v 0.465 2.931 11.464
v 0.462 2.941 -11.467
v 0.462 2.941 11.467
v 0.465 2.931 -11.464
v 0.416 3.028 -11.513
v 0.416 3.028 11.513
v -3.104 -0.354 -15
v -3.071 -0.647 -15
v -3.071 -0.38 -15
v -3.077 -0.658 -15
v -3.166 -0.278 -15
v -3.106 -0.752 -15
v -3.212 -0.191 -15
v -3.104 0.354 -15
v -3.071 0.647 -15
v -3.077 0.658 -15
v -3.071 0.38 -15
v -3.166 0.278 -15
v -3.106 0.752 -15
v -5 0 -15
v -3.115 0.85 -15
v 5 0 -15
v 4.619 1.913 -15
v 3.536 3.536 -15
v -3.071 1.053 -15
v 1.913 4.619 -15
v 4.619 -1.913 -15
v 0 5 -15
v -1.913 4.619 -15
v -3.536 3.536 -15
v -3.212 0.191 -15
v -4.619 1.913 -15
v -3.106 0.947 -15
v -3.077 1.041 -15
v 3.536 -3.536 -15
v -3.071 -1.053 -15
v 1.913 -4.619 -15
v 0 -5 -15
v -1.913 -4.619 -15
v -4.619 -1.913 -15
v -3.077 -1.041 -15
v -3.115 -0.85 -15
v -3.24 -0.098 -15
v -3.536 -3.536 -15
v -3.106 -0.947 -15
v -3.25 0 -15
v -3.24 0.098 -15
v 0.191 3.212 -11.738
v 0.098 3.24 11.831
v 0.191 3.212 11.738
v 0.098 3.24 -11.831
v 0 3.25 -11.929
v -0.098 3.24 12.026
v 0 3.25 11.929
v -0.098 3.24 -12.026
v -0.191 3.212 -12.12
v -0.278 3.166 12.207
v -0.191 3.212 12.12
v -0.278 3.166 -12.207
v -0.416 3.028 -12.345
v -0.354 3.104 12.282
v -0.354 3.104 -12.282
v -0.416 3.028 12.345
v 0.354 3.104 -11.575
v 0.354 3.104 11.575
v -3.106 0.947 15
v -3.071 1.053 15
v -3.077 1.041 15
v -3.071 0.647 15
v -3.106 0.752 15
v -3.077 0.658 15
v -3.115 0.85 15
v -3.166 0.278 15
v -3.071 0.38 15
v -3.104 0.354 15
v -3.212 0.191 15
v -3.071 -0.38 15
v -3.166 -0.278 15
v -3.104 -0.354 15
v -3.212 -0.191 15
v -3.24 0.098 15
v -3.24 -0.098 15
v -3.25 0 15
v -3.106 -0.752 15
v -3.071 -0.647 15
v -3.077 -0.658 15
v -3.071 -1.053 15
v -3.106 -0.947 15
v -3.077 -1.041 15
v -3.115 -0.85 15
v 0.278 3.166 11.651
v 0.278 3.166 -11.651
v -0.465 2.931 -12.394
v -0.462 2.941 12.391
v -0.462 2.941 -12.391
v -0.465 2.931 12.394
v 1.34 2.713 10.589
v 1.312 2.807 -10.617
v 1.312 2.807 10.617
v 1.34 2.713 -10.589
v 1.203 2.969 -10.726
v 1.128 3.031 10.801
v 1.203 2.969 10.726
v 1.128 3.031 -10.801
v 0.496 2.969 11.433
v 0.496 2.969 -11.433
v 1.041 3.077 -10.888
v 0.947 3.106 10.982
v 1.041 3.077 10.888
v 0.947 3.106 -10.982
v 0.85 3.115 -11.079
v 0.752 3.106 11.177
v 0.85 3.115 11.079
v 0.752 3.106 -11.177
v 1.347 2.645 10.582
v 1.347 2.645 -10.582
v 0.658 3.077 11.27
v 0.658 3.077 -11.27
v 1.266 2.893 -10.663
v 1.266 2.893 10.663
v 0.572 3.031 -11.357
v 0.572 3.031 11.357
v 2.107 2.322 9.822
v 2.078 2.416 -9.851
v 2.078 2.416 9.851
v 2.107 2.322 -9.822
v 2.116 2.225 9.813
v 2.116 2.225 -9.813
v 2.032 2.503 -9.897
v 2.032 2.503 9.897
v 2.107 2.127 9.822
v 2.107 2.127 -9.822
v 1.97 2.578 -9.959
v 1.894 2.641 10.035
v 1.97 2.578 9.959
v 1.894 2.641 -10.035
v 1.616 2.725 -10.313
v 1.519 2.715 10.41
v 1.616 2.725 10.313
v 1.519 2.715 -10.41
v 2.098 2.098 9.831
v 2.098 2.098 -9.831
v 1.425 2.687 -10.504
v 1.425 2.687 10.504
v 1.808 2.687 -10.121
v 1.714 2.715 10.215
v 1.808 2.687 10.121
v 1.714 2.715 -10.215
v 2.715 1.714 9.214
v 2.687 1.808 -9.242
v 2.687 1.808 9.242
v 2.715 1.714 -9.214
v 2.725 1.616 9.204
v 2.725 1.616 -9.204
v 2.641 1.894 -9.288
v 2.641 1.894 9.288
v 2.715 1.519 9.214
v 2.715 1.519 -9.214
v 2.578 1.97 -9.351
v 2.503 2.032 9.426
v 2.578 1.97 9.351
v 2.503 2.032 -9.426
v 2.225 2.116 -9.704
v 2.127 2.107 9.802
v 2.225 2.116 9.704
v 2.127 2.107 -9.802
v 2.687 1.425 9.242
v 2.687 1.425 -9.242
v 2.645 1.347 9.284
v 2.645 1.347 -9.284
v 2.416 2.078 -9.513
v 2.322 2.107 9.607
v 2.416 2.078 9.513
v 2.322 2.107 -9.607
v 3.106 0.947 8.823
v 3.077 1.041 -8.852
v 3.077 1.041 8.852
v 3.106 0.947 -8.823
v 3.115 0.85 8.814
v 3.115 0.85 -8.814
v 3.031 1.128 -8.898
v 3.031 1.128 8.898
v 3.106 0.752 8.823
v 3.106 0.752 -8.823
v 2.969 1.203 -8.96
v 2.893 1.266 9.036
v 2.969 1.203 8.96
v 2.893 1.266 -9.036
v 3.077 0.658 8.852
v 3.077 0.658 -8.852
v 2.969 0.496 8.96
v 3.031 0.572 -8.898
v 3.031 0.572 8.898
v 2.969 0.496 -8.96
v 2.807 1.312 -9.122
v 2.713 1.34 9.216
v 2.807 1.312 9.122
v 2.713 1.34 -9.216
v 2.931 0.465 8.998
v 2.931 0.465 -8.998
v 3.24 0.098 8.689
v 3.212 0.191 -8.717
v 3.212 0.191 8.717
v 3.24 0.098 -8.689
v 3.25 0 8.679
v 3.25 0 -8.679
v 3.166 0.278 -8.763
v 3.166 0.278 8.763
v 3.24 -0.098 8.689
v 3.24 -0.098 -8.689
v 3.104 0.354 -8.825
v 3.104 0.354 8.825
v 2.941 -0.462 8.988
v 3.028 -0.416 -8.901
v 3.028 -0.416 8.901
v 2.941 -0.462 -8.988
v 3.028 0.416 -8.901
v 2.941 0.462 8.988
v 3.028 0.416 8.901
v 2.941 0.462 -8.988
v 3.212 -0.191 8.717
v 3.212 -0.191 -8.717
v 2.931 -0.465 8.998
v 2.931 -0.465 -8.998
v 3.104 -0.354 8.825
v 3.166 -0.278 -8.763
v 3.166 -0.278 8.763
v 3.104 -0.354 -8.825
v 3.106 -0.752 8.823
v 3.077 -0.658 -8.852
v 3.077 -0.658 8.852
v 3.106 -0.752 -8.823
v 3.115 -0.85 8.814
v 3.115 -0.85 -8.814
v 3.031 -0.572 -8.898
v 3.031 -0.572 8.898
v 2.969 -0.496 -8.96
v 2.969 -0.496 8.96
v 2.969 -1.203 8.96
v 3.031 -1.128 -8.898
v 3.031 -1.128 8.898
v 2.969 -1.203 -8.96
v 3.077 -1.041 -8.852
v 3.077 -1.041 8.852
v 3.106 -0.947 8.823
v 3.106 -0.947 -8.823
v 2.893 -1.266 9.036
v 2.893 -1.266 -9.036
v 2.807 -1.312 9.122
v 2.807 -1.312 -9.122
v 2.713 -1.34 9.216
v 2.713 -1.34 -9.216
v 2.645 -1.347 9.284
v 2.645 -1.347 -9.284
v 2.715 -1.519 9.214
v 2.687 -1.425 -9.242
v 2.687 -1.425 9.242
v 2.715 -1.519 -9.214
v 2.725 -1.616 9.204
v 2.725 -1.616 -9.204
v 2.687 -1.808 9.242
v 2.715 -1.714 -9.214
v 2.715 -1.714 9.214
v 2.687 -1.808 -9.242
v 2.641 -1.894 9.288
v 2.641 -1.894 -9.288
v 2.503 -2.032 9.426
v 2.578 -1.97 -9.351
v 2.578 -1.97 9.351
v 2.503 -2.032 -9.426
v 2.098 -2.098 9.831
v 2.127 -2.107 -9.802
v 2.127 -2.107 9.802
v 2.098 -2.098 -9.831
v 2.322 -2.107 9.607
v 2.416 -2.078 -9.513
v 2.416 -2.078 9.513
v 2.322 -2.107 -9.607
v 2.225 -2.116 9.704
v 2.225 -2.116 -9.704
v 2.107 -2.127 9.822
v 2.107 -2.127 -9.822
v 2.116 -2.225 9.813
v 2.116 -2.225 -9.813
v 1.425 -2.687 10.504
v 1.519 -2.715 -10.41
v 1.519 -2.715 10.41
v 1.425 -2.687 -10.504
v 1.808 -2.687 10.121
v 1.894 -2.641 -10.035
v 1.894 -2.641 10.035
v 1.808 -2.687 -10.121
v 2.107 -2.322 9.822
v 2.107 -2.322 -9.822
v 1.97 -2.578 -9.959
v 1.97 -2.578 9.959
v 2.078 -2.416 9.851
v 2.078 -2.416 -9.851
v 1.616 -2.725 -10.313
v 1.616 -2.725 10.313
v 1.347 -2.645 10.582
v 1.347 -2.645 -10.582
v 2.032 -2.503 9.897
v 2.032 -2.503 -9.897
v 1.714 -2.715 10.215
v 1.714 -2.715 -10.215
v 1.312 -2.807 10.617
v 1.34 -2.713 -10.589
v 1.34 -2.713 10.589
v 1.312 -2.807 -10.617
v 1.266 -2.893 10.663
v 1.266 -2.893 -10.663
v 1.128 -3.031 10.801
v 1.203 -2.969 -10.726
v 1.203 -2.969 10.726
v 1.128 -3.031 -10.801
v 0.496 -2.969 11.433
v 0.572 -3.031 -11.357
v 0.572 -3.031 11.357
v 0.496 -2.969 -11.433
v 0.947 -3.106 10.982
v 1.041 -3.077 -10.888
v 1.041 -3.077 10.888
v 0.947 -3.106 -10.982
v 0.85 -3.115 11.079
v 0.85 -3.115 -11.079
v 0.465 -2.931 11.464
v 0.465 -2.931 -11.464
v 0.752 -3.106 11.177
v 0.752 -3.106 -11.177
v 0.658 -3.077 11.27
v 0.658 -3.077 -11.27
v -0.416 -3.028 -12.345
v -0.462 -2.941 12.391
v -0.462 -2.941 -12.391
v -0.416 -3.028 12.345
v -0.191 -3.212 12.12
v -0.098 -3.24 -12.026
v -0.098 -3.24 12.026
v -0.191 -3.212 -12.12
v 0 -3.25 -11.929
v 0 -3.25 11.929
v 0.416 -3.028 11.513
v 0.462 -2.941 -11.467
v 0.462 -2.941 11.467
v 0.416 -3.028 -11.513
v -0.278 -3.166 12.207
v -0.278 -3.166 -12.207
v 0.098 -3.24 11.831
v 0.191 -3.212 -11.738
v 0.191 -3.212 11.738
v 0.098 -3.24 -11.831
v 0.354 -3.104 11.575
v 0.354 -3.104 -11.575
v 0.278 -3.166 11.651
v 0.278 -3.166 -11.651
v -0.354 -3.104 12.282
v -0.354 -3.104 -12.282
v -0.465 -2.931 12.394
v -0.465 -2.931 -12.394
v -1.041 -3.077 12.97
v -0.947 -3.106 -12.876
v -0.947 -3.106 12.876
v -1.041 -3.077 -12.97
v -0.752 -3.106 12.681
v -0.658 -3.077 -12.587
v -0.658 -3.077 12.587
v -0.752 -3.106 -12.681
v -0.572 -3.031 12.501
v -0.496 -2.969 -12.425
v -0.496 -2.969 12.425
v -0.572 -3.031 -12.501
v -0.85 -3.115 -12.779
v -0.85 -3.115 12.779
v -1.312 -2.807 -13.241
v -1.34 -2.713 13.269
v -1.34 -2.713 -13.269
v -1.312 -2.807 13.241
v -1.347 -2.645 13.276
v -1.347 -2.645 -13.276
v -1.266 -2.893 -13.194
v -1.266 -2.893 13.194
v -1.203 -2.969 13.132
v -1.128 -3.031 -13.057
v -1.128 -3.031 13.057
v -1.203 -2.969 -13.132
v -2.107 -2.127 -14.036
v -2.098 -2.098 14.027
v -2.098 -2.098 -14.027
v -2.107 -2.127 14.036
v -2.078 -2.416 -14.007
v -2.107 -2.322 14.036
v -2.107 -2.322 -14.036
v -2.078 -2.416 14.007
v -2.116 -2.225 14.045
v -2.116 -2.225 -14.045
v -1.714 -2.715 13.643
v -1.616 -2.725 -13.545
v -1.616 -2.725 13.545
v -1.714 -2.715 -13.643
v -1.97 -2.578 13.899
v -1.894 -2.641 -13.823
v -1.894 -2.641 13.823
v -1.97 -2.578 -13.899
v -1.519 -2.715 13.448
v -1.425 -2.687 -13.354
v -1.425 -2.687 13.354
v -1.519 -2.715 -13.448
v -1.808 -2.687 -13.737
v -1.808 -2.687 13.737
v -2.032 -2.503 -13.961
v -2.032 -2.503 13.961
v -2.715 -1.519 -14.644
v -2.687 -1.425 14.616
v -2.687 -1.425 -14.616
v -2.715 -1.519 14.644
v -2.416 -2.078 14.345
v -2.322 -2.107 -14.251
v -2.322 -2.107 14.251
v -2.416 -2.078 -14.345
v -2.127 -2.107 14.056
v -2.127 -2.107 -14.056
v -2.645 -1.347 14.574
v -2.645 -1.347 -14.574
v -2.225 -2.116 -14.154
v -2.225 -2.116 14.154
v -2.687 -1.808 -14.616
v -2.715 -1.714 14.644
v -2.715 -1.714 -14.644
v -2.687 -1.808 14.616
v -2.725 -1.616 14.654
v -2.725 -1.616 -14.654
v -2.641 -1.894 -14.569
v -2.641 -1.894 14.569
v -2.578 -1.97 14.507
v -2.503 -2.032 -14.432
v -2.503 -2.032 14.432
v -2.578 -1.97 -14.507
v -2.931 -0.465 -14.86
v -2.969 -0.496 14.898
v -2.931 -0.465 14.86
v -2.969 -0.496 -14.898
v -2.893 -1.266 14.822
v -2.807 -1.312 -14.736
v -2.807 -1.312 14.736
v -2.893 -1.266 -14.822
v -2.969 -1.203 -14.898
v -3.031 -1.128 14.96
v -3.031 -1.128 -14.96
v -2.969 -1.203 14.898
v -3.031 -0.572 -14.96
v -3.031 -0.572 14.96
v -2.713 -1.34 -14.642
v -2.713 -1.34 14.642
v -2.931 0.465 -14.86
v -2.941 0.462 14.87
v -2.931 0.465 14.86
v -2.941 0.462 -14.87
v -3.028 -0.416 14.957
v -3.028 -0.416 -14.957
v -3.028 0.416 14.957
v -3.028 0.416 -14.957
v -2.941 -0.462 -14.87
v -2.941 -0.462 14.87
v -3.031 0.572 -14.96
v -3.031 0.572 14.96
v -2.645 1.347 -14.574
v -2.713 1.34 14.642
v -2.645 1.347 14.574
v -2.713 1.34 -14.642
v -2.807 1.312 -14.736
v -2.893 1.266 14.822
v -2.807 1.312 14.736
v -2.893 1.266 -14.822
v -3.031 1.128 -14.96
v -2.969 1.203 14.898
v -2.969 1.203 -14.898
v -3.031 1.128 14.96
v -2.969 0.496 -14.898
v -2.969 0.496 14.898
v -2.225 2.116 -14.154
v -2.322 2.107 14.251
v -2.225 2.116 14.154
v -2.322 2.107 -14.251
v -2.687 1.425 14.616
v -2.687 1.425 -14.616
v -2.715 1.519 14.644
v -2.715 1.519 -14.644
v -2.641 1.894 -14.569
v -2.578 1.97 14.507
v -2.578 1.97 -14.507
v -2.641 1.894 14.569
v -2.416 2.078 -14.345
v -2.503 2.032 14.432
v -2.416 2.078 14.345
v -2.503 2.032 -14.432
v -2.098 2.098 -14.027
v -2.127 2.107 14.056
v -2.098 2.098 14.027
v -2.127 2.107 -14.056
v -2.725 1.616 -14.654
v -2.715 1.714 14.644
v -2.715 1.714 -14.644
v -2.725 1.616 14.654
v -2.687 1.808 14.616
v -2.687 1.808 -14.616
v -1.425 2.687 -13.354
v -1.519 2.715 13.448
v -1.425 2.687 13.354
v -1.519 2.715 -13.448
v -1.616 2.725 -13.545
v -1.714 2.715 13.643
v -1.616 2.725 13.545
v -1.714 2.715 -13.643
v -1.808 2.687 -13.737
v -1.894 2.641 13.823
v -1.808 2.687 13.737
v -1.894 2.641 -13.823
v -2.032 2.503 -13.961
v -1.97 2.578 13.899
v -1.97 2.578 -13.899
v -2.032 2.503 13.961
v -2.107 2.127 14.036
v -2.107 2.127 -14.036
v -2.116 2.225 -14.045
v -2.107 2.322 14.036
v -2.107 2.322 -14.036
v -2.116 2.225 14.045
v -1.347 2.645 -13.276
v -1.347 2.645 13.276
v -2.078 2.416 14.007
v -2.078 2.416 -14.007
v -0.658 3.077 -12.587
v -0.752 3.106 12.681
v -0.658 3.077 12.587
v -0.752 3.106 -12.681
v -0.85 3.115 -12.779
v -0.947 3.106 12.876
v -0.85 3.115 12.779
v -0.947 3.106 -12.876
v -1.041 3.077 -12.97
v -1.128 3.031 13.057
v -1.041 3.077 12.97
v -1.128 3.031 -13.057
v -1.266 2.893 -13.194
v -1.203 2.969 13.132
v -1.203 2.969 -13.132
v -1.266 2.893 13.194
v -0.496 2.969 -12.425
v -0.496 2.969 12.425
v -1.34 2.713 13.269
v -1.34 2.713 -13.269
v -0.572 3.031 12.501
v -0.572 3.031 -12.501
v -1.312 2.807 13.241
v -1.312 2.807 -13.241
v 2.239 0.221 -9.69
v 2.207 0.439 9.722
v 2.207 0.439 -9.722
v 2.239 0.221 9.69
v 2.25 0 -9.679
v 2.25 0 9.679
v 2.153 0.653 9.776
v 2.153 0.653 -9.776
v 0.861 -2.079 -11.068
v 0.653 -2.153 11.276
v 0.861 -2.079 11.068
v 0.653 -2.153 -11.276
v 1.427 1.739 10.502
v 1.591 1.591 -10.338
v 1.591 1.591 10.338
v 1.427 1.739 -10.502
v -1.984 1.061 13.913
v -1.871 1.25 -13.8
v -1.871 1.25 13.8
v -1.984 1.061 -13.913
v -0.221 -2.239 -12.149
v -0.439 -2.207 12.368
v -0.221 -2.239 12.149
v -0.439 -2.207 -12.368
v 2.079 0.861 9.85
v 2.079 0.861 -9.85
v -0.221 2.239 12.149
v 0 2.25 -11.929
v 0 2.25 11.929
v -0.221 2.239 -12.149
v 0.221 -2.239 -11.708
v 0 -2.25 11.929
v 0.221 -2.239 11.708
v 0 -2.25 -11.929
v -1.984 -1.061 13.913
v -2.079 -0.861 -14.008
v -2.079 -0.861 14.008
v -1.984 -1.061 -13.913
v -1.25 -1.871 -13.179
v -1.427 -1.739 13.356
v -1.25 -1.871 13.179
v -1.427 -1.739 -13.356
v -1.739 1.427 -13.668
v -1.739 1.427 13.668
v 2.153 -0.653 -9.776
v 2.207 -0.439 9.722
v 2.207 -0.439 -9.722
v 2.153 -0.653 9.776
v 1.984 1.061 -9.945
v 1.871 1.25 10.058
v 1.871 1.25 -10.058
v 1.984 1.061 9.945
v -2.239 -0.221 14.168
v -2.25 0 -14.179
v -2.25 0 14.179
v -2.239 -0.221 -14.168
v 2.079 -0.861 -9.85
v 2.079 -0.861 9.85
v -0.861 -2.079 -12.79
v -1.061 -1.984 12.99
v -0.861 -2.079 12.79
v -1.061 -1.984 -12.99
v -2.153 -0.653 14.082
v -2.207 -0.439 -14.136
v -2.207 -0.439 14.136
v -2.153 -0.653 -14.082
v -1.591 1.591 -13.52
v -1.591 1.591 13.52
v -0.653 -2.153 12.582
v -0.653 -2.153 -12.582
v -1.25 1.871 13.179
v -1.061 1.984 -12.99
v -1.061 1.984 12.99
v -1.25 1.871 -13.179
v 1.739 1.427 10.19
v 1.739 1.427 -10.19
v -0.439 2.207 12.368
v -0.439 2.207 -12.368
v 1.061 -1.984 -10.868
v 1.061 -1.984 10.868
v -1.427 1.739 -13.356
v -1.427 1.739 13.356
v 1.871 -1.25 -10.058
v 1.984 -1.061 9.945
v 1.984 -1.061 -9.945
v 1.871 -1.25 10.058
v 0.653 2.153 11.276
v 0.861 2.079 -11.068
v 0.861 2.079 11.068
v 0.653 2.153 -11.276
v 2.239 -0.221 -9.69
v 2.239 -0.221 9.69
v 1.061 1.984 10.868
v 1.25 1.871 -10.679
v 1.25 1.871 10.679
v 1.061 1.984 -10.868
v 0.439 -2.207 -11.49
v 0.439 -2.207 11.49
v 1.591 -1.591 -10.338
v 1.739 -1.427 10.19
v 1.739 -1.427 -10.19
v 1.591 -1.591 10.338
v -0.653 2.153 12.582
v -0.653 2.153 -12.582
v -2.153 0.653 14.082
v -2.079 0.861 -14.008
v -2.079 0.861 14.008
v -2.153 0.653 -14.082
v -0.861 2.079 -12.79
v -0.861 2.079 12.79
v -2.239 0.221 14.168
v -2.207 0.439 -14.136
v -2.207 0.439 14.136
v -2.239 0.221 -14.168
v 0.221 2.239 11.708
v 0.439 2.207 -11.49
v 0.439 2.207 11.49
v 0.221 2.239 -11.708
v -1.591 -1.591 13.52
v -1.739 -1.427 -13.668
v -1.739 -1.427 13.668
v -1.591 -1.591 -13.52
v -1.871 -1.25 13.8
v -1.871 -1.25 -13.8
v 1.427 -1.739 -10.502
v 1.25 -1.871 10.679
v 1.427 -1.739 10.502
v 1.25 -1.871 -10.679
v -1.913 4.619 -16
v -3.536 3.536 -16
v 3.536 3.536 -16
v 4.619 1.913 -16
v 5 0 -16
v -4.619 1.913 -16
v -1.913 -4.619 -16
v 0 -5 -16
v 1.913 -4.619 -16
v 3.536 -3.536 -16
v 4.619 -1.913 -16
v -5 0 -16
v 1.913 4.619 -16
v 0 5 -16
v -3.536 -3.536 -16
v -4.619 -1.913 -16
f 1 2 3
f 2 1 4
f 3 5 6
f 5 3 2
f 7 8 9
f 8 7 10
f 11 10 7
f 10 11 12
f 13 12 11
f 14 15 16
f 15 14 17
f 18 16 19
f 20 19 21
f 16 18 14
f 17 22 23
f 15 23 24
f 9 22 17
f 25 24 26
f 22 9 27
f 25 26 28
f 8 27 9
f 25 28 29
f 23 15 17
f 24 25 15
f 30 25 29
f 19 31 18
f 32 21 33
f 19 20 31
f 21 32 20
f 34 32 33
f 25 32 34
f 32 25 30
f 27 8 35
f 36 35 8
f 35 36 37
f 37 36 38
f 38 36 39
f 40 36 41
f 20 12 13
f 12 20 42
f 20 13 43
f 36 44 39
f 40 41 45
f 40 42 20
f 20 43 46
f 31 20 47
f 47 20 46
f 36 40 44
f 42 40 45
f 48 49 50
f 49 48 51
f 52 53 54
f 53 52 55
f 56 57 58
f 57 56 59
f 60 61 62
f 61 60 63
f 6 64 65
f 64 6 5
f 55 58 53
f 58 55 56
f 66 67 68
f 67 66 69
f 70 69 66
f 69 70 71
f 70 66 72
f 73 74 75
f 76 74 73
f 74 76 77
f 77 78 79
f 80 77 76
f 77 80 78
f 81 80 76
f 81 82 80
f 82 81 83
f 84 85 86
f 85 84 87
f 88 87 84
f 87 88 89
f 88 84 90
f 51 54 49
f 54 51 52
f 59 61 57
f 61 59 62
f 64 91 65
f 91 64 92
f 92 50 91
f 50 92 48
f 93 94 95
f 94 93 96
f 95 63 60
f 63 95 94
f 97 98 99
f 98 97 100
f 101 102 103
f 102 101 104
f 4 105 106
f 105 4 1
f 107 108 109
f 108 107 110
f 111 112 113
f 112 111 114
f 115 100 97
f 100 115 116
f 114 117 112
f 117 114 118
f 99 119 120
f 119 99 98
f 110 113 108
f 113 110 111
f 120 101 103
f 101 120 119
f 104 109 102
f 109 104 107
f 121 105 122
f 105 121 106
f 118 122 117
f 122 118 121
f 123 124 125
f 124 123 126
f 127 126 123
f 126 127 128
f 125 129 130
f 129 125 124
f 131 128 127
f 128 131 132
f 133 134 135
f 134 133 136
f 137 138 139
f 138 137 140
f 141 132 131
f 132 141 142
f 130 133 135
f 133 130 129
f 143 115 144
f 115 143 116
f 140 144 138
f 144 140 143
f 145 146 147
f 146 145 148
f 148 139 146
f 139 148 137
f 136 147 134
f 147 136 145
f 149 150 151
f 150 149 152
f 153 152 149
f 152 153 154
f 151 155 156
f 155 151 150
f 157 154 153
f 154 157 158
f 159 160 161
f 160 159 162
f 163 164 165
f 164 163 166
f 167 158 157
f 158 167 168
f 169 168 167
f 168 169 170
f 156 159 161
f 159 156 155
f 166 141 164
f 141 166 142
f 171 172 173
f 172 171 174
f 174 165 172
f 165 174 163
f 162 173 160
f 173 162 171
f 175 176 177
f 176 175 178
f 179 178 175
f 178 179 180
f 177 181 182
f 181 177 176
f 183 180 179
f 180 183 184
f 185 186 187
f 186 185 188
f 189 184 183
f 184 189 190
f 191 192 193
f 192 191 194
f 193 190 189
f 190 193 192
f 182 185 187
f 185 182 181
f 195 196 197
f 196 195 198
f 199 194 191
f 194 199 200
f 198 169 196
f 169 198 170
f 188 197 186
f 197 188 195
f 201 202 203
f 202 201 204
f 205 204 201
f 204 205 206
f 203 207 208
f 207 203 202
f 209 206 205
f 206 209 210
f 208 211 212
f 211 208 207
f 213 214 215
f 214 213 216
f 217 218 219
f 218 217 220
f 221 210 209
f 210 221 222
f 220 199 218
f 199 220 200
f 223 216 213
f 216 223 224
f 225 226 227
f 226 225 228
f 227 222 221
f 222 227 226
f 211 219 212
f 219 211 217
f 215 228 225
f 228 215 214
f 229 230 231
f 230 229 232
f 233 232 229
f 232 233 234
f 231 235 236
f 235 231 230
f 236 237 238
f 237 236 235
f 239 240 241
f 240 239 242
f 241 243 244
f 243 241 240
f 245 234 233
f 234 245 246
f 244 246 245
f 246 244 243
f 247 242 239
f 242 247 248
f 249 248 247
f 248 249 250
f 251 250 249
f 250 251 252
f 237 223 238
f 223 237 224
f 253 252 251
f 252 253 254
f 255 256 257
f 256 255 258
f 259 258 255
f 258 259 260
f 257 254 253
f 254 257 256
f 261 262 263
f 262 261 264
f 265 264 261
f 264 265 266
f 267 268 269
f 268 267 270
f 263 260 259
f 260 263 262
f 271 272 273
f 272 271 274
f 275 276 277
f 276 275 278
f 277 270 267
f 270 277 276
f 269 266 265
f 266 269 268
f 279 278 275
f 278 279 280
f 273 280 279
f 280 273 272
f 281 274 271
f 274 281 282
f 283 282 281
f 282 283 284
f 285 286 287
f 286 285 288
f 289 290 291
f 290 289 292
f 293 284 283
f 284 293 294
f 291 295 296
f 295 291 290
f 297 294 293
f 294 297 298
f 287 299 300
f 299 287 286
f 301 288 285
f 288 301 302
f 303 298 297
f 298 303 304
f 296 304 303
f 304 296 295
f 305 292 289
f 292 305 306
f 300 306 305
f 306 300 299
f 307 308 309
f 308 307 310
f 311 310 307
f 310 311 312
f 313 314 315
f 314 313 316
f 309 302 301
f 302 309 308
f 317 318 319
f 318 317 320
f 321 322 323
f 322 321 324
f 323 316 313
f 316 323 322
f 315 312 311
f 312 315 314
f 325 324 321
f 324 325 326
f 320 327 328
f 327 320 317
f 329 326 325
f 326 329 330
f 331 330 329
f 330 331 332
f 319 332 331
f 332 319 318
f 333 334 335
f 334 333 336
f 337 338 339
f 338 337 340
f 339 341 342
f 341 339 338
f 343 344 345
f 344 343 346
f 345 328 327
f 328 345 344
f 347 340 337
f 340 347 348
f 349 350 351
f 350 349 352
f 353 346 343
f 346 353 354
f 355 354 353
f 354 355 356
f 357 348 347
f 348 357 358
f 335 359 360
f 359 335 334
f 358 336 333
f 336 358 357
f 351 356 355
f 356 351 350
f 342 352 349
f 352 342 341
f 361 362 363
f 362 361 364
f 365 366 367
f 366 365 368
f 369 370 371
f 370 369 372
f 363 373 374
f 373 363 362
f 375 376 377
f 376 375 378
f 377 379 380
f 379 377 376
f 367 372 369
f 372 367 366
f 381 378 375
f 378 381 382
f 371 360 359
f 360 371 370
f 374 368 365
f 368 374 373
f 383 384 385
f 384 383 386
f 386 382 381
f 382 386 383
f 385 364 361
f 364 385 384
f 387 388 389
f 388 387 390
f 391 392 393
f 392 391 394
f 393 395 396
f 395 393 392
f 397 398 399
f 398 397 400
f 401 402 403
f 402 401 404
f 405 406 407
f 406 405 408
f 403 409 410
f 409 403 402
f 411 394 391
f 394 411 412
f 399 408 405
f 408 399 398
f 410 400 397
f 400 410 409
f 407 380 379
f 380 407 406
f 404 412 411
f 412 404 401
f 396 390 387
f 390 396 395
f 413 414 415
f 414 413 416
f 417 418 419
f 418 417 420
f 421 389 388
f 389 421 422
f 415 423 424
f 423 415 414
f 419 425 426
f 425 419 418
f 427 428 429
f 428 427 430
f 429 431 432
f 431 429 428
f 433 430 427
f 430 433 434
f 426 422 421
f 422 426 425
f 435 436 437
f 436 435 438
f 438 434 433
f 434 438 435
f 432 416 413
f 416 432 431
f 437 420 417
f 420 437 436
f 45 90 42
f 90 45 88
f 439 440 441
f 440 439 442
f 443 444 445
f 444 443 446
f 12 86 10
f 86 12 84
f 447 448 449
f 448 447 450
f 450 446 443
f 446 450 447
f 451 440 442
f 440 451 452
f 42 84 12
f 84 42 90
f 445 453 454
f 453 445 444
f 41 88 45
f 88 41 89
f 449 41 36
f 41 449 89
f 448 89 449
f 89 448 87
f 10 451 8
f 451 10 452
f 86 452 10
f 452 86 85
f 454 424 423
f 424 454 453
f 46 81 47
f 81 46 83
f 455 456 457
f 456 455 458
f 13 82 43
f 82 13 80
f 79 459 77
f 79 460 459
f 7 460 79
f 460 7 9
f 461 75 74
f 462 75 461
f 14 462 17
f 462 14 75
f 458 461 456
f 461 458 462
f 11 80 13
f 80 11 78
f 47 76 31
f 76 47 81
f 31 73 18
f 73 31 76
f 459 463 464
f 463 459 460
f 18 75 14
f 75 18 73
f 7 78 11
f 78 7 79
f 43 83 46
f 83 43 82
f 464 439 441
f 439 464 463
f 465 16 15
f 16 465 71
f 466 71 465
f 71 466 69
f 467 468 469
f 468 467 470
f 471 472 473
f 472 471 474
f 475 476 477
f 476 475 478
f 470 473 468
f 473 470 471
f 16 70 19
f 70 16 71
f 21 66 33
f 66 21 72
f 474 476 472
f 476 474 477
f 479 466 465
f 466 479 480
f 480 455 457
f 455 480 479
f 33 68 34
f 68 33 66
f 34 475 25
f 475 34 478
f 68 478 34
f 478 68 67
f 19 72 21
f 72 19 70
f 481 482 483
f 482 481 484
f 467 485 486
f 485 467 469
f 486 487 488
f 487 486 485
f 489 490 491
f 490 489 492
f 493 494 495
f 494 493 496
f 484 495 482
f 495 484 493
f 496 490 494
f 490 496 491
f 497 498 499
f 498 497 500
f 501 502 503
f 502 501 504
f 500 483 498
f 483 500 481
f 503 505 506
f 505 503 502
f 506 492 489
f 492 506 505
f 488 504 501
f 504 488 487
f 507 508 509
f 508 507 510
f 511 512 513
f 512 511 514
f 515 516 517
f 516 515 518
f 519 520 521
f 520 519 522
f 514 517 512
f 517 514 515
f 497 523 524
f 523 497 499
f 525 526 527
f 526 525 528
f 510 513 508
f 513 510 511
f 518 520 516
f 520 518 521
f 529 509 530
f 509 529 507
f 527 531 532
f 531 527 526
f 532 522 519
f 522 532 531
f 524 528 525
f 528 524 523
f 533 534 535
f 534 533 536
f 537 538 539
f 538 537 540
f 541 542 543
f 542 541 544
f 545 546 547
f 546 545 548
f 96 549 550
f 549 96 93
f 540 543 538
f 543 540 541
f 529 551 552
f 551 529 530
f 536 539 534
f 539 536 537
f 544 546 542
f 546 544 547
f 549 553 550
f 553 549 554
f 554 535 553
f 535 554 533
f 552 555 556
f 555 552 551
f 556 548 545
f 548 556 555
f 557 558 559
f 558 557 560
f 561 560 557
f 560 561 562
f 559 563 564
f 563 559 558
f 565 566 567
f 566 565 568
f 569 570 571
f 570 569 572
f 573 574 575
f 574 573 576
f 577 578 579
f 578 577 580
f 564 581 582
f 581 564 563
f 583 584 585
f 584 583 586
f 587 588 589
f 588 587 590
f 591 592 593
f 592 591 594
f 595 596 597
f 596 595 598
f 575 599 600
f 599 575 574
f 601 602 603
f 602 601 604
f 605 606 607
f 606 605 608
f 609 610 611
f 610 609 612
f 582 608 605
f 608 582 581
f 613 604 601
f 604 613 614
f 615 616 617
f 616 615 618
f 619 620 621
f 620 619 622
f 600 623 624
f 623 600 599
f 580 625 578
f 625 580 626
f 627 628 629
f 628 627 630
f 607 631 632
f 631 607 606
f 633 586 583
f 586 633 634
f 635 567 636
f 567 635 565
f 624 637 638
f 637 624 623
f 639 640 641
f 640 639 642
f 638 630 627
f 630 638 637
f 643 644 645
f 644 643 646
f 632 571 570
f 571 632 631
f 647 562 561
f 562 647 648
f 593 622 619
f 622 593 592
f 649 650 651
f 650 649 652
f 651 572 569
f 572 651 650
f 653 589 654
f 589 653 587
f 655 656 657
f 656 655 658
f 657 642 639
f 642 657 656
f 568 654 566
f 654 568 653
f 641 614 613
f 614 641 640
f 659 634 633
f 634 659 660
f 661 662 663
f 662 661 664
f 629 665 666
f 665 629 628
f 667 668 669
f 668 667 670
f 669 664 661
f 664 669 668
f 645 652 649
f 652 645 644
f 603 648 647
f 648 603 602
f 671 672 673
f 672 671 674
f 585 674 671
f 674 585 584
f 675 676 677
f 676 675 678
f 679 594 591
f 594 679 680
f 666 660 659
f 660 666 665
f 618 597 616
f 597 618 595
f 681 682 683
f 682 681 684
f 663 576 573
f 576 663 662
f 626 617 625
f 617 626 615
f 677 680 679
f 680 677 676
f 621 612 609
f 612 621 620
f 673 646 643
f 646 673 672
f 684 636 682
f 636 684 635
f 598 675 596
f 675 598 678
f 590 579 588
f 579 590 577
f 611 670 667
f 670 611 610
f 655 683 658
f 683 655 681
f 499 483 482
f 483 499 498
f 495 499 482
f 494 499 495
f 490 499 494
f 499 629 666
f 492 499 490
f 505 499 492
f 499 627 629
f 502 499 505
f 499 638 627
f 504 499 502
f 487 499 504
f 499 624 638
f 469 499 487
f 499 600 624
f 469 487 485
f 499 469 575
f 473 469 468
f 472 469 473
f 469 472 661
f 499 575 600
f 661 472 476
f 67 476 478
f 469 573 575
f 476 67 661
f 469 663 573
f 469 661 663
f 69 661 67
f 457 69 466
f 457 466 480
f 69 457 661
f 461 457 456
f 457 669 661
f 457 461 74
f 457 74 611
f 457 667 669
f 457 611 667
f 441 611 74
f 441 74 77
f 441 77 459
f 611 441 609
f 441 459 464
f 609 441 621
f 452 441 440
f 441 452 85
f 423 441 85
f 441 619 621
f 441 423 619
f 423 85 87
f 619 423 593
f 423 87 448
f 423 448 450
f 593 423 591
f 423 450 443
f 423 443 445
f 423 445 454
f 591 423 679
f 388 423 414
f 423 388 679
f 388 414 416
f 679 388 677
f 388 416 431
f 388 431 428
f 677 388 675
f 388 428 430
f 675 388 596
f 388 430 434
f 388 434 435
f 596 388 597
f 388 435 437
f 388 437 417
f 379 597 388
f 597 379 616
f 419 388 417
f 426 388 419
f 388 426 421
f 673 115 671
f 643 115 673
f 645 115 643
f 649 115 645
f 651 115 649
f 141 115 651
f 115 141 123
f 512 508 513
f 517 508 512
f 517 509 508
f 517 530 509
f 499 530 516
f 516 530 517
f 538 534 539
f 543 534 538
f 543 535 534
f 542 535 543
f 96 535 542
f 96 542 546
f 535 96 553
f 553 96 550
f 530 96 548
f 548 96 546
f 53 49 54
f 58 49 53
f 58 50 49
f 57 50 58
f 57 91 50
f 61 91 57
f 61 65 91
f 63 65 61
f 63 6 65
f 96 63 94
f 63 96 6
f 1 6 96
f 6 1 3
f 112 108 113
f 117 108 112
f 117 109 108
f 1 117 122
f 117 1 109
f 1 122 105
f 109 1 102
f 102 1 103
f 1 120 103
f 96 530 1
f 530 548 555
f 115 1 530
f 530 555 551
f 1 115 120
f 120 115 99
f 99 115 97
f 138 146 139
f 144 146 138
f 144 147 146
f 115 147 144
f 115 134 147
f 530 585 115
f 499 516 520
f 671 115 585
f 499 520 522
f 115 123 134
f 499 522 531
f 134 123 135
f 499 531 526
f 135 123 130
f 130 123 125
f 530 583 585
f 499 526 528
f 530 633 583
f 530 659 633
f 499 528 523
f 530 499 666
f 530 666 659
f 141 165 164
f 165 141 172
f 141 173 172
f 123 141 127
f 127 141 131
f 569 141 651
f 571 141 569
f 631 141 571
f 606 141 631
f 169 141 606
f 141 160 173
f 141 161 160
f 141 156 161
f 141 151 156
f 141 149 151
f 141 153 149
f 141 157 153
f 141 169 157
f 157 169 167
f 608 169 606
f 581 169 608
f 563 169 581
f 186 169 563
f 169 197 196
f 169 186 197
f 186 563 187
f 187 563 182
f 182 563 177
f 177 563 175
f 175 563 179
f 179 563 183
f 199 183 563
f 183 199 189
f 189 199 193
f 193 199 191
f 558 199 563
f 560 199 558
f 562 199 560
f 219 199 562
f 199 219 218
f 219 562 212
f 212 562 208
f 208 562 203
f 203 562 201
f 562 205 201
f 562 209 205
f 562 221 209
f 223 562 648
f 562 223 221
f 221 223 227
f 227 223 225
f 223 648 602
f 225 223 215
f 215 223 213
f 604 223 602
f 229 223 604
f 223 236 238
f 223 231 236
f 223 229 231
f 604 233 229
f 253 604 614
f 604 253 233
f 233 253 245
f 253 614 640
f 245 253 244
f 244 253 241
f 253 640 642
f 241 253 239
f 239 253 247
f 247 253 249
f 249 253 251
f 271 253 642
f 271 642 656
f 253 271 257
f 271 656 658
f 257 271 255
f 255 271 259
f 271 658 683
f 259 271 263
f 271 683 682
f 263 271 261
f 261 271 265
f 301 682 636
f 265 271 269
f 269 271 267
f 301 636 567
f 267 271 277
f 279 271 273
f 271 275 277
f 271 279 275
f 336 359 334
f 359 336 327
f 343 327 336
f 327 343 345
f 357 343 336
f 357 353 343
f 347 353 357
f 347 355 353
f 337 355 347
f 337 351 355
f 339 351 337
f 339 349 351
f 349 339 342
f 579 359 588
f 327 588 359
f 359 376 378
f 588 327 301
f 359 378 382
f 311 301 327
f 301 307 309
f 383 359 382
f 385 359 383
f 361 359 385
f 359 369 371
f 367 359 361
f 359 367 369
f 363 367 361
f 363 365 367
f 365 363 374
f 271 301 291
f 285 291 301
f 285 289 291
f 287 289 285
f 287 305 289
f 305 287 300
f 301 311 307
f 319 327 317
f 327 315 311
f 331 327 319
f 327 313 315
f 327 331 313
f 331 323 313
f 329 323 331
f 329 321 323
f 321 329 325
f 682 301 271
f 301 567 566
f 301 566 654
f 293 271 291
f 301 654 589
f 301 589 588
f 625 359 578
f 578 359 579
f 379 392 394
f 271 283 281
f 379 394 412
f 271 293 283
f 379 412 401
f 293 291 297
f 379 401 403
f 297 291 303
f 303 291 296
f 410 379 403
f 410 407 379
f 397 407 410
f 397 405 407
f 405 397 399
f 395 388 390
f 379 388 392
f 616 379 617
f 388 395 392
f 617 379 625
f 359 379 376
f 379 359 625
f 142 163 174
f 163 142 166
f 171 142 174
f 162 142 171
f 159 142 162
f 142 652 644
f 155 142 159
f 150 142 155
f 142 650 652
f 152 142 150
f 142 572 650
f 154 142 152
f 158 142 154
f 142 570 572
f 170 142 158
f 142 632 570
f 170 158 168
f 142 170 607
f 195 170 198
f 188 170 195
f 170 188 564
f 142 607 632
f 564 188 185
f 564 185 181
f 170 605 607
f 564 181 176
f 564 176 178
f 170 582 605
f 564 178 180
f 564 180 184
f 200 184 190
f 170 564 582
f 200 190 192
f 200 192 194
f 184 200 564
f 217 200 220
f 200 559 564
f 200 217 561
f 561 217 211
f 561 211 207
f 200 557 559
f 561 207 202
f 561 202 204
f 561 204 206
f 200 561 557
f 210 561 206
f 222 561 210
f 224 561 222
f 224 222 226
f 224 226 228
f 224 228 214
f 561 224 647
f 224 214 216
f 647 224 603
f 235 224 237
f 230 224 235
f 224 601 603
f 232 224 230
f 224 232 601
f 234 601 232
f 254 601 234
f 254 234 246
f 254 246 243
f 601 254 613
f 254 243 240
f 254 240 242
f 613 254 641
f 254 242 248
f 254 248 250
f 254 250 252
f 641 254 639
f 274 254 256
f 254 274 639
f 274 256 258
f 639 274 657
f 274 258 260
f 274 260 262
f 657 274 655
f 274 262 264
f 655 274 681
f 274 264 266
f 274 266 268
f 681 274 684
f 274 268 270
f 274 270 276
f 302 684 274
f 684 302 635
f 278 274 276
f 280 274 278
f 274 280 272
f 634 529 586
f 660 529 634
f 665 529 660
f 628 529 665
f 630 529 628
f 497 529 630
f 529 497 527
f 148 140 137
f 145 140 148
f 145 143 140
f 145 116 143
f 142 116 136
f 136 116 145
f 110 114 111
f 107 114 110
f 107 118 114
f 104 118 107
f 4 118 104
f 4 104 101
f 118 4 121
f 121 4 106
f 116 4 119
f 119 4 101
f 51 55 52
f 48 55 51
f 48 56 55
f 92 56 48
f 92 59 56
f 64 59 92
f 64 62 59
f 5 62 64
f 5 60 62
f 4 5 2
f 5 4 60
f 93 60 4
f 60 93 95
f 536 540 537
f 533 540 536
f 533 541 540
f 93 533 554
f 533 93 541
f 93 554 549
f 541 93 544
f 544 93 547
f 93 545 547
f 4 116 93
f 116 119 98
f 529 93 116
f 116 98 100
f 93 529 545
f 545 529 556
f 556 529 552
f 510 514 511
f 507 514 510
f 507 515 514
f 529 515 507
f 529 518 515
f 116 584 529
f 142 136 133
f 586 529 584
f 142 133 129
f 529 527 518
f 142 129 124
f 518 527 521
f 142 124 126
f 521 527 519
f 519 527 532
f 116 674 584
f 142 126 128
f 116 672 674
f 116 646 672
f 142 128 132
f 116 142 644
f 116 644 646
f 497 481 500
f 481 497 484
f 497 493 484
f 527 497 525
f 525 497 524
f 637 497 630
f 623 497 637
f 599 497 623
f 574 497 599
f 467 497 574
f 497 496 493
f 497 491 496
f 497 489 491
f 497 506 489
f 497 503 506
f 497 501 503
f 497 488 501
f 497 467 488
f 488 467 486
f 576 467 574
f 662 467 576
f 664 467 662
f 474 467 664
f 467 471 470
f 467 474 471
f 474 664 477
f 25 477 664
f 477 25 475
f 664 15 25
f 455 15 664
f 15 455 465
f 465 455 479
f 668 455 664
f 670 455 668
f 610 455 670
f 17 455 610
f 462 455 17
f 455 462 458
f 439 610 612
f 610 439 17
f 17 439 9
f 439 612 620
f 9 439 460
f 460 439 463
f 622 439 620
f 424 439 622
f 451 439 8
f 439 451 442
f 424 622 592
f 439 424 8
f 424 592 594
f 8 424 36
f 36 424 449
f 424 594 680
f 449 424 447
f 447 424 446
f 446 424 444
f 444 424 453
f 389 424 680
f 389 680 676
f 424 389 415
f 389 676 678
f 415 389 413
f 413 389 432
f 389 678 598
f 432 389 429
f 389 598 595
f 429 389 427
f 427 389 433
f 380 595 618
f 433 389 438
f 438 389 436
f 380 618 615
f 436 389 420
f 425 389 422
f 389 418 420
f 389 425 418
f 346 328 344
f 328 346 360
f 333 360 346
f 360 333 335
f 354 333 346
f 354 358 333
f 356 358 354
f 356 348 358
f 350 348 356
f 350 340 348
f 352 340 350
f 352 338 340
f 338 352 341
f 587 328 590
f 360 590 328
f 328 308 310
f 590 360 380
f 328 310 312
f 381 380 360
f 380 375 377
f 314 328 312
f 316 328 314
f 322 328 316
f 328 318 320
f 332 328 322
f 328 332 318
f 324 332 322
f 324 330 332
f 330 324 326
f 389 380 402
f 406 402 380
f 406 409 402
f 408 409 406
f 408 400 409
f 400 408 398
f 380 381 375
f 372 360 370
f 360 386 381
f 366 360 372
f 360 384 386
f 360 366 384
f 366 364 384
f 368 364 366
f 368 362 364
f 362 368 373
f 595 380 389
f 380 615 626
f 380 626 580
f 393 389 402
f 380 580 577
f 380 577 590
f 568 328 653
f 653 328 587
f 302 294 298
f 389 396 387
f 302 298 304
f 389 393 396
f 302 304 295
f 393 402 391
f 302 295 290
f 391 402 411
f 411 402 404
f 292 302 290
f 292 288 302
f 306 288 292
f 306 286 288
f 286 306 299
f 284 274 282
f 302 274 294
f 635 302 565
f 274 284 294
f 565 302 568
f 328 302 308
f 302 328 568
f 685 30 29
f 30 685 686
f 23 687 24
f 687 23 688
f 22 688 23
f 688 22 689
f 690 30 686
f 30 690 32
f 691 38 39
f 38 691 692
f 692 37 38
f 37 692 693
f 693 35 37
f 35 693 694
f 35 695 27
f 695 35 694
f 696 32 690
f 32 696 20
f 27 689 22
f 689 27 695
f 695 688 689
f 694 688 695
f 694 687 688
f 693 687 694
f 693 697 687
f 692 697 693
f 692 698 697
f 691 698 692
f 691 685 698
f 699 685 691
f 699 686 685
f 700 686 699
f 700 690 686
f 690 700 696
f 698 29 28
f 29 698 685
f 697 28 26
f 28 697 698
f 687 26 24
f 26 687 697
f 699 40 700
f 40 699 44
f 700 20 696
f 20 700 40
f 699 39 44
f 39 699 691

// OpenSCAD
penne();

height = 30;
id = 4.5;
od = 6;
ripple_d = 1.0;
md = od - (ripple_d / 2);
num_ripples = 20;
pi = 3.14159265;
cut_box_height = 10;
base_height = 1;
base_radius = (od / 2) + 2;

module base()
{
    translate([0, 0, -((height / 2) + (base_height / 2))]) 
    		cylinder(h = base_height, r1 = base_radius, r2 = base_radius, center=true);
}

module cut()
{	
	union()
	{
		translate([0, 0, (height / 2) + (cut_box_height / 2) - 1])
			rotate(a = 45, v=[0,1,0])
				cube([od * 4, od * 4, cut_box_height], center=true);
		translate([0, 0, -((height / 2) + (cut_box_height / 2) - 1)])
			rotate(a = -45, v=[0,1,0])
				cube([od * 4, od * 4, cut_box_height], center=true);
	}
}

module ripples()
{
	for (i = [0:num_ripples]) 
        assign(deg = (360 / num_ripples) * i)
		{
			translate( [(md / 2) * sin(deg), (md / 2) * cos(deg), 0] ) 
				cylinder(h = height, r1 = ripple_d / 2, r2 = ripple_d / 2, center = true, $fn=32);
		}
}

module penne()
{
	union()
	{
	    difference()
		{
			difference()
				{
					union()
					{
						cylinder(h = height, r1 = od / 2, r2 = od / 2, center = true);
						ripples();
					}
					cylinder(h = height, r1 = id / 2, r2 = id / 2, center = true, $fn=64);		
				}
			cut();
		}
		base();
	}
}
